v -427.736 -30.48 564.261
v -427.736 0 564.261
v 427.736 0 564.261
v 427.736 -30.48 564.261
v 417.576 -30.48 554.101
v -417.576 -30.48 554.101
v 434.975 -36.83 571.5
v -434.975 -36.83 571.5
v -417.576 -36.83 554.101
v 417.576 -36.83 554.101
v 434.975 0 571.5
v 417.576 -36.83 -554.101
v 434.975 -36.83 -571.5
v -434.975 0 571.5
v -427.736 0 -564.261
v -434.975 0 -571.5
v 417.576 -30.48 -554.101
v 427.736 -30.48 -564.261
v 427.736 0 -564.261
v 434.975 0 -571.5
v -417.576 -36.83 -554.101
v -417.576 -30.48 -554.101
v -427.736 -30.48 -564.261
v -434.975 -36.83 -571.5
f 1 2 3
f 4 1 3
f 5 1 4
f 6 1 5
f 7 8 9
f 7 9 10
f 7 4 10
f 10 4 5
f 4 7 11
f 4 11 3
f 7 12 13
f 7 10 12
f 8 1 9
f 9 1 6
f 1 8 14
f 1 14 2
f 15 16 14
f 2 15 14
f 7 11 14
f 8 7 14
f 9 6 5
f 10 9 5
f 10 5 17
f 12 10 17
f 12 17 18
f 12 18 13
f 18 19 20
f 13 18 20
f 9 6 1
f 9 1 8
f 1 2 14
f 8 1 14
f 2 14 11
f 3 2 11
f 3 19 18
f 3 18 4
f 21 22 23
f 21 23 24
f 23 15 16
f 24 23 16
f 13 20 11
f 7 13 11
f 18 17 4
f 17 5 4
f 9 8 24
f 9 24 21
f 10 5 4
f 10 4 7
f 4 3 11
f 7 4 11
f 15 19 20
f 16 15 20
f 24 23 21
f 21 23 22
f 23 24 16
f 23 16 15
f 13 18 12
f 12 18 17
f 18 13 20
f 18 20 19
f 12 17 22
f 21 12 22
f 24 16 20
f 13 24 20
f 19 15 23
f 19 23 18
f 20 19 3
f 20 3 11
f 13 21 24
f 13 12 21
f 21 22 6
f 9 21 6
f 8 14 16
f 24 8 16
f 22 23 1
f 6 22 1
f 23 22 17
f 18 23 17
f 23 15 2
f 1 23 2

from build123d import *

# Parameters (mm, degrees)
F2_DEPTH = 36.83
F4_DEPTH = 36.83
F5_W     = 855.472
F5_H     = 1128.522
F6_DEPTH = 30.48


with BuildPart() as f2:
    # F1 (on face) → F2 (new body)
    with BuildSketch(Plane.XZ):
        Polygon((-434.975, 571.5), (-434.975, -571.5), (-417.576, -554.101), (-417.576, 554.101), align=None)
        Polygon((417.576, -554.101), (434.975, -571.5), (434.975, 571.5), (417.576, 554.101), align=None)
    extrude(amount=F2_DEPTH)


with BuildPart() as f4:
    # F3 (on Front) → F4 (new body, through all)
    with BuildSketch(Plane.XZ):
        Polygon((434.975, 571.5), (-434.975, 571.5), (-417.576, 554.101), (417.576, 554.101), align=None)
        Polygon((-417.576, -554.101), (-434.975, -571.5), (434.975, -571.5), (417.576, -554.101), align=None)
    extrude(amount=F4_DEPTH)


with BuildPart() as f6_tool:
    # F5 (on face) → F6 (new body)
    with BuildSketch(Plane.XZ):
        Rectangle(F5_W, F5_H)
    extrude(amount=F6_DEPTH)


with BuildPart() as f2_1:
    add(f2.part)

    # F6: cut by f6_tool
    add(f6_tool.part, mode=Mode.SUBTRACT)


with BuildPart() as f4_1:
    add(f4.part)

    # F6: cut by f6_tool
    add(f6_tool.part, mode=Mode.SUBTRACT)


solid = Compound([f2_1.part, f4_1.part])
